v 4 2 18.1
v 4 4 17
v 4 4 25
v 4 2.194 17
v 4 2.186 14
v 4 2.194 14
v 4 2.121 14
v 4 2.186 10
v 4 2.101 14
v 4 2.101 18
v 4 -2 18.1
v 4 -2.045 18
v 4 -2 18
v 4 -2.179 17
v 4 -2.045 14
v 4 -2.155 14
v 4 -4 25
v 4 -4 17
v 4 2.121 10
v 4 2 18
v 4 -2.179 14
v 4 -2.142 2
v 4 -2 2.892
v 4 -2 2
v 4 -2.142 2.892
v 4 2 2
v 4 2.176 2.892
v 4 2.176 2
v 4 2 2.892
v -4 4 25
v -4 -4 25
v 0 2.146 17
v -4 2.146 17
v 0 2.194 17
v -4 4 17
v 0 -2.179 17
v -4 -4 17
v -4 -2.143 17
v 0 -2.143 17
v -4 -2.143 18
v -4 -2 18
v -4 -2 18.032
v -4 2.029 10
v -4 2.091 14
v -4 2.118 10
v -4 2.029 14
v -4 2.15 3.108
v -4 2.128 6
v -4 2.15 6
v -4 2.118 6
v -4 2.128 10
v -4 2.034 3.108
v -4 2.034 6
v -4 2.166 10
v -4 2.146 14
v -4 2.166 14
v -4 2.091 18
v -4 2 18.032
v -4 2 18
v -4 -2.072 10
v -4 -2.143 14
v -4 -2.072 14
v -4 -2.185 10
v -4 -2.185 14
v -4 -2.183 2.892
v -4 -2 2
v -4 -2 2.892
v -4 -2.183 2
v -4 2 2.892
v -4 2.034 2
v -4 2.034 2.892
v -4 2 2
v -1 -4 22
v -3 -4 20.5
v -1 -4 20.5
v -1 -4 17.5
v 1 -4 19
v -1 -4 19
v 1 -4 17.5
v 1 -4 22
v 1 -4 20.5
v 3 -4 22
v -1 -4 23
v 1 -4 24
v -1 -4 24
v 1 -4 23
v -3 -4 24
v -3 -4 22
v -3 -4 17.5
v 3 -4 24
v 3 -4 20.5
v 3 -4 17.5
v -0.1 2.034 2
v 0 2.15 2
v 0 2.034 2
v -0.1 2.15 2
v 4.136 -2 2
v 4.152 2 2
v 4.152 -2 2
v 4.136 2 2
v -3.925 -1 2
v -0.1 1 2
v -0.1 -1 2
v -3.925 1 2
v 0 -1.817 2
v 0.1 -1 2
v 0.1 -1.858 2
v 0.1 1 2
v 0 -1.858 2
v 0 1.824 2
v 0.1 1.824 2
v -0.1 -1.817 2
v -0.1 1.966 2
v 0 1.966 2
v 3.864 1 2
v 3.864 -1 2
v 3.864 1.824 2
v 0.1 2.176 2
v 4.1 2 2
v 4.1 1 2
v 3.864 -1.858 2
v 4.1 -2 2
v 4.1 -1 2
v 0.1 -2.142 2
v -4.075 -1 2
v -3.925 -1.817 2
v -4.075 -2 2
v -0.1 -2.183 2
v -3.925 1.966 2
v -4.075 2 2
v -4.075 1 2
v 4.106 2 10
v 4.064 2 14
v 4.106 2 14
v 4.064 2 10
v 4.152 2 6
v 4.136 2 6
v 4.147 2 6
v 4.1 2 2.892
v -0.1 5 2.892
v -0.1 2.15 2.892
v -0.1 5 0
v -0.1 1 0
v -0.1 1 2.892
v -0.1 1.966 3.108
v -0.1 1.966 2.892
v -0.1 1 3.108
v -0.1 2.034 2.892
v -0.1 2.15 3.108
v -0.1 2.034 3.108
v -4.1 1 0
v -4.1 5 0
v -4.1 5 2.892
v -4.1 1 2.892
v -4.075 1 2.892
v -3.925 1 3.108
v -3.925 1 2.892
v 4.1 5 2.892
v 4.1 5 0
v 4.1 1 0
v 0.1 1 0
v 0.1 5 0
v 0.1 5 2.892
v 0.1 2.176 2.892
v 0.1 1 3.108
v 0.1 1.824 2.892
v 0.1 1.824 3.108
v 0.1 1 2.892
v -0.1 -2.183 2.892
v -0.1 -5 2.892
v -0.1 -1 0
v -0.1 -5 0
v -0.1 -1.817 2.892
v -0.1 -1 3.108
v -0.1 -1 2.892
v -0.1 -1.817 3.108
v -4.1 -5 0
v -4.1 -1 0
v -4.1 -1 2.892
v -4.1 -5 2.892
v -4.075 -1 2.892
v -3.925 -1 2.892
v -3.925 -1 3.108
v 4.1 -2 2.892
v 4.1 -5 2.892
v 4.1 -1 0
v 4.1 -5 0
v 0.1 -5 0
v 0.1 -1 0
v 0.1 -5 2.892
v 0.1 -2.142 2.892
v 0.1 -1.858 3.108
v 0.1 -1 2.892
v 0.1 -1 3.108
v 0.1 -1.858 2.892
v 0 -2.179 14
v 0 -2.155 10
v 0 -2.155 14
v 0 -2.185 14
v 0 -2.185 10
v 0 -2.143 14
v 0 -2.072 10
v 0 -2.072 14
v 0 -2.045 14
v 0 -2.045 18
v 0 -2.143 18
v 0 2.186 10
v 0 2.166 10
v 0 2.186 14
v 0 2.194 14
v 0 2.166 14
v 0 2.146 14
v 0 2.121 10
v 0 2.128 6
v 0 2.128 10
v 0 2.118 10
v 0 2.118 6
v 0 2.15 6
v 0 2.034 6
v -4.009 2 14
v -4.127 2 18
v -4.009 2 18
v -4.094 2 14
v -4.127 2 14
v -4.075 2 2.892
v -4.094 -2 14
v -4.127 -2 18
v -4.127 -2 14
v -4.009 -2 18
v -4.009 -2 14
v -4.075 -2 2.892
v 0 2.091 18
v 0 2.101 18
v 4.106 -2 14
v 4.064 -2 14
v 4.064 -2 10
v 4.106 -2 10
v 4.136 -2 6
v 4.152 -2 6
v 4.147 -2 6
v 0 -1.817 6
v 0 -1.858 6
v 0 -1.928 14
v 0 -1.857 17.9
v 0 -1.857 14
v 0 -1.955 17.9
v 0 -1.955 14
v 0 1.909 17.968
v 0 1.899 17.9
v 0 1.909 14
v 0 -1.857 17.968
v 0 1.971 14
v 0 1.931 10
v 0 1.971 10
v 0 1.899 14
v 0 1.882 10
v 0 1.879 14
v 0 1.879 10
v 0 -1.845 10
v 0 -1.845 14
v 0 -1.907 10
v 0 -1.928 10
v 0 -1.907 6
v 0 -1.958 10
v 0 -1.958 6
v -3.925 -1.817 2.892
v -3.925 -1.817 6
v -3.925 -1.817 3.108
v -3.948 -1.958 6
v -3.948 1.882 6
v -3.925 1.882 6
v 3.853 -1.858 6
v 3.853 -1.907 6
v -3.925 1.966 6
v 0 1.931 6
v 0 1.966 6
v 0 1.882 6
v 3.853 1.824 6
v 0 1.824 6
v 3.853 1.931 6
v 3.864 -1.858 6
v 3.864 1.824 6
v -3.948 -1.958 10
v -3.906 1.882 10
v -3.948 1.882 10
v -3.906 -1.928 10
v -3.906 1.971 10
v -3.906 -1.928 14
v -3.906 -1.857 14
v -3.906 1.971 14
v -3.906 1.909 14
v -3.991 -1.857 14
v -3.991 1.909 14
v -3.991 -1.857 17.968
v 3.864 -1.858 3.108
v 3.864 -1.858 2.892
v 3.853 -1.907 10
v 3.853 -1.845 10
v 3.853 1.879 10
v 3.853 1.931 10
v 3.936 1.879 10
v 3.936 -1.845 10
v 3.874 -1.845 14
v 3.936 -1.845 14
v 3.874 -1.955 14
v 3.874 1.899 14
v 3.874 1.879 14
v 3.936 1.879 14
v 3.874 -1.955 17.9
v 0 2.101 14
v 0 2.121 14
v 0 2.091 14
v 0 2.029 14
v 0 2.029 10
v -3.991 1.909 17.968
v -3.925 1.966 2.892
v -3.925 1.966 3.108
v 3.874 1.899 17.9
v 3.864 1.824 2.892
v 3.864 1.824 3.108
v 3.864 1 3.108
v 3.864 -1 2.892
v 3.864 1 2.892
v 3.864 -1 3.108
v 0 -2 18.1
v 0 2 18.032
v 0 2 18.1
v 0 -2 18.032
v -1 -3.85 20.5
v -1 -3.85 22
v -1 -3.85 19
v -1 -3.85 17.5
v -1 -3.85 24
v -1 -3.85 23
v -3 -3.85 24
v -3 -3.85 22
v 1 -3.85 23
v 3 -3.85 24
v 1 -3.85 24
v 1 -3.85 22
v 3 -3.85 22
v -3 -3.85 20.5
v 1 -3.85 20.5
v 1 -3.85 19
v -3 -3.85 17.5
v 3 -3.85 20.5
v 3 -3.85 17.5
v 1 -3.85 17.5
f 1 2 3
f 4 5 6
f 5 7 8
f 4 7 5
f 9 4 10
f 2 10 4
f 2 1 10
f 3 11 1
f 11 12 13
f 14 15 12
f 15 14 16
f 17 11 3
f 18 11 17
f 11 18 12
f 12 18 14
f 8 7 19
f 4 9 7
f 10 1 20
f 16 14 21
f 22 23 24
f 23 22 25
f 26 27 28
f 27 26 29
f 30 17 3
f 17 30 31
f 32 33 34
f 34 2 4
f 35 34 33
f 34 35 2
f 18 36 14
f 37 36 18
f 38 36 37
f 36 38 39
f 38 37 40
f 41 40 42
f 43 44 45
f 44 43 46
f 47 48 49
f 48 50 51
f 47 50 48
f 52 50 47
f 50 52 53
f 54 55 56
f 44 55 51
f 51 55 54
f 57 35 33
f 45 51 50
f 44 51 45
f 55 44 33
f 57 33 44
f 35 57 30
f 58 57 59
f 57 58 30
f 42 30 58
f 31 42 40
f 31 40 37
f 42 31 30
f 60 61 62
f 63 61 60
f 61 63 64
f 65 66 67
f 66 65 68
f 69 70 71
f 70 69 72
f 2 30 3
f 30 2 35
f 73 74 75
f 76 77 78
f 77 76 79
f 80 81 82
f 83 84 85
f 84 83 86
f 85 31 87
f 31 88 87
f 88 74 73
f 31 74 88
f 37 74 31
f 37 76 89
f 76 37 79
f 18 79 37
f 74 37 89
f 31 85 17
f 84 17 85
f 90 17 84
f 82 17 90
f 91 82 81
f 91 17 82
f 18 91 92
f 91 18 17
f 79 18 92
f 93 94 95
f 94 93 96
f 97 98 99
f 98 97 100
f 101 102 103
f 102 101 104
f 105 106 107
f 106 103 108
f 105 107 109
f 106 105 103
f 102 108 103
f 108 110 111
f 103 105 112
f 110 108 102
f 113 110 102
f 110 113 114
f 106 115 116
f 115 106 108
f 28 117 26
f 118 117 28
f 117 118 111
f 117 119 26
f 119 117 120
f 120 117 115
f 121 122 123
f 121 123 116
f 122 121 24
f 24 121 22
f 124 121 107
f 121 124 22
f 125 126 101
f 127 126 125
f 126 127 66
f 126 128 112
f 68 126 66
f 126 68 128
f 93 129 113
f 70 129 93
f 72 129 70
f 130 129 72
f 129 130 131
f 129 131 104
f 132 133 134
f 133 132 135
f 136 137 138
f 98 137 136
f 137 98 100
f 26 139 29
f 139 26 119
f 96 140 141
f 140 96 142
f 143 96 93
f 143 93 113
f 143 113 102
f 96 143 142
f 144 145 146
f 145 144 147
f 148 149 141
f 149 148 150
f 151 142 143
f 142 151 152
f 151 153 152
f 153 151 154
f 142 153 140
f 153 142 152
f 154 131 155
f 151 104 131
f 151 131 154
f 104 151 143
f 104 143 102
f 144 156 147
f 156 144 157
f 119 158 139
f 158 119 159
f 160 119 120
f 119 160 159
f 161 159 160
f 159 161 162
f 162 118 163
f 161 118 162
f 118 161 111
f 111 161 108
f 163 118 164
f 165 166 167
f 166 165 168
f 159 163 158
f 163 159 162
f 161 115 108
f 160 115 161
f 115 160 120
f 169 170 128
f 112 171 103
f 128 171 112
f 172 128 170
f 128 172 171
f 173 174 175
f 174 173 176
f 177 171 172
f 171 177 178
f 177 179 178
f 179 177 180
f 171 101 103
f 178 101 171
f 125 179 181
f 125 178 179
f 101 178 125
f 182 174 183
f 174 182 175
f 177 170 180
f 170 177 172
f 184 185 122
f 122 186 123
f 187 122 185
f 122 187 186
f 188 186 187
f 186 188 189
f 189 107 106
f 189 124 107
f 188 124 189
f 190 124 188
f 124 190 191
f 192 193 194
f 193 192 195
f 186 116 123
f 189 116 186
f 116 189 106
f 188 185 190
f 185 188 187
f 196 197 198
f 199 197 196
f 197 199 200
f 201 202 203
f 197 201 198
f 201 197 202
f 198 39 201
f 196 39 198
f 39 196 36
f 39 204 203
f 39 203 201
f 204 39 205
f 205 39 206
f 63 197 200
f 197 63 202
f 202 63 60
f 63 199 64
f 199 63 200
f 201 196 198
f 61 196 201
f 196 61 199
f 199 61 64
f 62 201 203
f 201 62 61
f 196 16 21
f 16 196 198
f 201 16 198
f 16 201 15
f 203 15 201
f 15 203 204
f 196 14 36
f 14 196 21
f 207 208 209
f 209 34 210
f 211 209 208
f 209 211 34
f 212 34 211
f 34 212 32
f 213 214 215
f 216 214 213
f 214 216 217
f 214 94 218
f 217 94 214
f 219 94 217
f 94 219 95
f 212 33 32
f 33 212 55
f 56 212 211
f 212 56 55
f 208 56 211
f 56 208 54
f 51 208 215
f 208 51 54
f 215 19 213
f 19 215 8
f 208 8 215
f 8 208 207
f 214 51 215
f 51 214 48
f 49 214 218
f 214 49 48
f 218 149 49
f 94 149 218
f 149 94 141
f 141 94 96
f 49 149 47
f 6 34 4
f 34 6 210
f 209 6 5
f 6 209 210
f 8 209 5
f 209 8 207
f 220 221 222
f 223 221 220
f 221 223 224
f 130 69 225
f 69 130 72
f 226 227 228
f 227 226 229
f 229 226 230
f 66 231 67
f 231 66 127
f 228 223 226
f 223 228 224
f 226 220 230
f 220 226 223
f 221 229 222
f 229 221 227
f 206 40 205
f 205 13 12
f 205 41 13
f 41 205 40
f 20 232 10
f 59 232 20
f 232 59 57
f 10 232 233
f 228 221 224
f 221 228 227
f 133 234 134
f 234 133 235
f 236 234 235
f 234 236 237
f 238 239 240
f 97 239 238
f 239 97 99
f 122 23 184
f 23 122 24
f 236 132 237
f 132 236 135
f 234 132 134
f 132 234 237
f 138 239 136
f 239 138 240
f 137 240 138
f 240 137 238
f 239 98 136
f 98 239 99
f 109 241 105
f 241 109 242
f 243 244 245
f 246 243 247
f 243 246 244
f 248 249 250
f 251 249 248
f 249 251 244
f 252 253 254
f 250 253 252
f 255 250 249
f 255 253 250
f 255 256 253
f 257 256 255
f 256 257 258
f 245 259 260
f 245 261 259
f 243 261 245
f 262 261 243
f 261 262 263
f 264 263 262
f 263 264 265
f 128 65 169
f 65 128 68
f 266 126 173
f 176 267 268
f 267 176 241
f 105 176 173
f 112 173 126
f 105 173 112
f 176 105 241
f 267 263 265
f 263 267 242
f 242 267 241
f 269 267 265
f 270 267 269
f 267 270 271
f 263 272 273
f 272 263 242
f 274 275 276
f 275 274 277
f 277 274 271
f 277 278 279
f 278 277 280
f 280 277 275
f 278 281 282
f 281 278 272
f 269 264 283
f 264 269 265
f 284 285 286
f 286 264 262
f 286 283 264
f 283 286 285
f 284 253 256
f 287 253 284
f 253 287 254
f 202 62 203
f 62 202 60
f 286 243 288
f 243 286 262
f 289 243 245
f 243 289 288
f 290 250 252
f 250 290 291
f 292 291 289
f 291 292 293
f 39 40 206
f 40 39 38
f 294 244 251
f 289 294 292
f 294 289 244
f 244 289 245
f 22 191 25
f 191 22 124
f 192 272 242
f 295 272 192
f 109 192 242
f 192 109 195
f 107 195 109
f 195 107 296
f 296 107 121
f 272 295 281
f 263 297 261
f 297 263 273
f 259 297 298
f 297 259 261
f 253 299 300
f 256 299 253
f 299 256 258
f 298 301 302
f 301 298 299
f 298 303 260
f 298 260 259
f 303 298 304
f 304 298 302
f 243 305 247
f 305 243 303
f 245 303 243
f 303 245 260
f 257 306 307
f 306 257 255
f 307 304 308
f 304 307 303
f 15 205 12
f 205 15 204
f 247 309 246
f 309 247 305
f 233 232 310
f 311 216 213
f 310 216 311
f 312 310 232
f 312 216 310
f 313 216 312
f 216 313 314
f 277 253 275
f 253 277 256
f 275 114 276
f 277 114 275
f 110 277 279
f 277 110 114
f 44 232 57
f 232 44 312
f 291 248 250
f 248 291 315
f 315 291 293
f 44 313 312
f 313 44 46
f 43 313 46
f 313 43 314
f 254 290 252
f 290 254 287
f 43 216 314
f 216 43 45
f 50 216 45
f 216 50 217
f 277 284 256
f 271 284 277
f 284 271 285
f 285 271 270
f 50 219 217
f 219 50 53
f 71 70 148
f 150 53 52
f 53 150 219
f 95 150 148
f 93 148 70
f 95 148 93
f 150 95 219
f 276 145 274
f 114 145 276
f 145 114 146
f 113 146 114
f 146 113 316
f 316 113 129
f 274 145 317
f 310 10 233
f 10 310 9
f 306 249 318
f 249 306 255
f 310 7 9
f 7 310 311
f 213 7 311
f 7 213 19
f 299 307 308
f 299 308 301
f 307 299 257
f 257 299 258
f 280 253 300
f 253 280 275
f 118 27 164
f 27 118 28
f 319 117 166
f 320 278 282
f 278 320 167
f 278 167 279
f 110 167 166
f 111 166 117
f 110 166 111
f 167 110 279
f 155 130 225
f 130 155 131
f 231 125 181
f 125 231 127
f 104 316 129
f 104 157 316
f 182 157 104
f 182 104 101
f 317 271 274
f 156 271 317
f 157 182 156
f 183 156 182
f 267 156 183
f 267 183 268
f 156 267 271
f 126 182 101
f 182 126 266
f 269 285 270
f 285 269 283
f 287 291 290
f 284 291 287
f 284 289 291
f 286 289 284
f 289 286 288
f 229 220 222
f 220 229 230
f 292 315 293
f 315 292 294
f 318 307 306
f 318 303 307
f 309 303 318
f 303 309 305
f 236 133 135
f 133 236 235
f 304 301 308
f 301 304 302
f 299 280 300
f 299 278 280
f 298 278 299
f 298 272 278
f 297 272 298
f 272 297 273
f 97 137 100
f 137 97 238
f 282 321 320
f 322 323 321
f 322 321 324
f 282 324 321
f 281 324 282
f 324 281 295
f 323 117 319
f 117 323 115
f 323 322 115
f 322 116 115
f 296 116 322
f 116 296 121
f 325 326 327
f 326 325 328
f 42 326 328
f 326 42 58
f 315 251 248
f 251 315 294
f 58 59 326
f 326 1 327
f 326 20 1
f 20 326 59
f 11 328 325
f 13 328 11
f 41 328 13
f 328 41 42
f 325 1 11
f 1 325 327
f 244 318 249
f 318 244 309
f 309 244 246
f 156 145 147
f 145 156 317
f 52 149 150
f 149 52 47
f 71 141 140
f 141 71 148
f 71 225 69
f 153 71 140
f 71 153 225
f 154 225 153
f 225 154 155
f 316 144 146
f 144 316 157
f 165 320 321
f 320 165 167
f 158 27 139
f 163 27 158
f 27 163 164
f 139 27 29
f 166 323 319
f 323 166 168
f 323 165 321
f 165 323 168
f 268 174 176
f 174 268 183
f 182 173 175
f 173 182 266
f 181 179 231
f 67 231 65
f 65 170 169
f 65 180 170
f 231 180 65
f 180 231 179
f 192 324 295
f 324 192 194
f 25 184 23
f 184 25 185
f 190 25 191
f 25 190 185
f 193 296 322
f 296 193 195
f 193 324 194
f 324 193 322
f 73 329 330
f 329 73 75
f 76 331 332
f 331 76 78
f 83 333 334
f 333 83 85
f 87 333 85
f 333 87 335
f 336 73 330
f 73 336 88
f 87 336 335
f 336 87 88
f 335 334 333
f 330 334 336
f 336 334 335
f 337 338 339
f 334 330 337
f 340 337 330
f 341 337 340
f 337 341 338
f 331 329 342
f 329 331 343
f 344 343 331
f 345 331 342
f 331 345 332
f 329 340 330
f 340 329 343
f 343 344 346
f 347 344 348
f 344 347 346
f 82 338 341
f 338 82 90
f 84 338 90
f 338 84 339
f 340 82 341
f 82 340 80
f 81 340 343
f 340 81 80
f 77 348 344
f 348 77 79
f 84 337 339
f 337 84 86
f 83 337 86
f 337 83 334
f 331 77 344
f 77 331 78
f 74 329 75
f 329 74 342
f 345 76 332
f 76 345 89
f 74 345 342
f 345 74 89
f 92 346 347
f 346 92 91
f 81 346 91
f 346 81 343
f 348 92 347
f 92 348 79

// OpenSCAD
// Minecraft Creeper Model - Final Surface Pixelation

// Parameters
head_size = 8;
body_w = 8;    
body_d = 4;    
body_h = 16;   
leg_w = 4;     
leg_d = 4;     
leg_h = 3;     

face_color = "black";
creeper_color = "green";

pixel_size = 4.0; 
jitter = 0.4;

function random(seed) = abs(sin(seed * 12.9898) * 43758.5453) - floor(abs(sin(seed * 12.9898) * 43758.5453));

module noise_grid(w, h, seed, exclude_face=false) {
    step = pixel_size;
    for (x = [0 : step : w - step]) {
        for (y = [0 : step : h - step]) {
            is_eye = false;
            is_nose = false;
            is_mouth = false;
            
            if (exclude_face) {
                cx = x - w/2 + step/2;
                cy = y - h/2 + step/2;
                is_eye = ((abs(cx) > 1 && abs(cx) < 3) && (cy > 1 && cy < 3));
                is_nose = ((abs(cx) < 1) && (abs(cy) < 2));
                is_mouth = ((abs(cx) > 1 && abs(cx) < 3) && (cy < -1 && cy > -4));
            }

            if (!(exclude_face && (is_eye || is_nose || is_mouth))) {
                z_noise = (random(seed + x*10 + y*20) - 0.5) * 2 * jitter;
                val = abs(z_noise); 
                translate([x + step/2, y + step/2, 0])
                    cube([step, step, val], center=true);
            }
        }
    }
}

module apply_surface_noise(normal_rot, face_center, w, h, seed, type="add", exclude_face=false) {
    translate(face_center) {
        rotate(normal_rot) {
            translate([-w/2, -h/2, 0]) {
                if (type == "add") {
                    color(creeper_color) noise_grid(w, h, seed, exclude_face);
                } else {
                    noise_grid(w, h, seed, exclude_face);
                }
            }
        }
    }
}

module base_head() {
    cube([head_size, head_size, head_size], center=true);
}

module base_body() {
    cube([body_w, body_d, body_h], center=true);
}

module base_leg() {
    cube([leg_w, leg_d, leg_h], center=true);
}

module pixelated_creeper() {
    difference() {
        union() {
            color(creeper_color) {
                translate([0, 0, 21]) base_head();
                translate([0, 0, 10]) base_body();
                translate([-2.1, 3, 1.5]) base_leg();
                translate([2.1, 3, 1.5]) base_leg();
                translate([-2.1, -3, 1.5]) base_leg();
                translate([2.1, -3, 1.5]) base_leg();
            }
            
            // Additive Noise
            apply_surface_noise([90, 0, 0], [0, -body_d/2, 10], body_w, body_h, 201, "add");
            apply_surface_noise([-90, 0, 0], [0, body_d/2, 10], body_w, body_h, 202, "add");
            apply_surface_noise([0, -90, 0], [-body_w/2, 0, 10], body_h, body_d, 203, "add");
            apply_surface_noise([0, 90, 0], [body_w/2, 0, 10], body_h, body_d, 204, "add");
            apply_surface_noise([0, 0, 0], [0, 0, 10 + body_h/2], body_w, body_d, 205, "add");
            
            for (p = [[-2.1, 3, 1.5], [2.1, 3, 1.5], [-2.1, -3, 1.5], [2.1, -3, 1.5]]) {
                translate(p) {
                    apply_surface_noise([90, 0, 0], [0, -leg_d/2, 0], leg_w, leg_h, 301, "add");
                    apply_surface_noise([-90, 0, 0], [0, leg_d/2, 0], leg_w, leg_h, 302, "add");
                    apply_surface_noise([0, -90, 0], [-leg_w/2, 0, 0], leg_h, leg_d, 303, "add");
                    apply_surface_noise([0, 90, 0], [leg_w/2, 0, 0], leg_h, leg_d, 304, "add");
                    apply_surface_noise([0, 0, 0], [0, 0, leg_h/2], leg_w, leg_d, 305, "add");
                }
            }
        }
        
        // Subtractive Noise
        apply_surface_noise([90, 0, 0], [0, -body_d/2, 10], body_w, body_h, 501, "sub");
        apply_surface_noise([-90, 0, 0], [0, body_d/2, 10], body_w, body_h, 502, "sub");
        apply_surface_noise([0, -90, 0], [-body_w/2, 0, 10], body_h, body_d, 503, "sub");
        apply_surface_noise([0, 90, 0], [body_w/2, 0, 10], body_h, body_d, 504, "sub");
        apply_surface_noise([0, 0, 0], [0, 0, 10 + body_h/2], body_w, body_d, 505, "sub");

        for (p = [[-2.1, 3, 1.5], [2.1, 3, 1.5], [-2.1, -3, 1.5], [2.1, -3, 1.5]]) {
            translate(p) {
                apply_surface_noise([90, 0, 0], [0, -leg_d/2, 0], leg_w, leg_h, 601, "sub");
                apply_surface_noise([-90, 0, 0], [0, leg_d/2, 0], leg_w, leg_h, 602, "sub");
                apply_surface_noise([0, -90, 0], [-leg_w/2, 0, 0], leg_h, leg_d, 603, "sub");
                apply_surface_noise([0, 90, 0], [leg_w/2, 0, 0], leg_h, leg_d, 604, "sub");
                apply_surface_noise([0, 0, 0], [0, 0, leg_h/2], leg_w, leg_d, 605, "sub");
            }
        }

        // Recessed face
        translate([0, -head_size/2 - 0.1, 21]) {
            color(face_color) {
                translate([-2, 0, 2]) cube([2, 0.5, 2], center=true);
                translate([2, 0, 2]) cube([2, 0.5, 2], center=true);
                translate([0, 0, 0]) cube([2, 0.5, 4], center=true);
                translate([-2, 0, -2]) cube([2, 0.5, 3], center=true);
                translate([2, 0, -2]) cube([2, 0.5, 3], center=true);
            }
        }
    }
}

pixelated_creeper();
